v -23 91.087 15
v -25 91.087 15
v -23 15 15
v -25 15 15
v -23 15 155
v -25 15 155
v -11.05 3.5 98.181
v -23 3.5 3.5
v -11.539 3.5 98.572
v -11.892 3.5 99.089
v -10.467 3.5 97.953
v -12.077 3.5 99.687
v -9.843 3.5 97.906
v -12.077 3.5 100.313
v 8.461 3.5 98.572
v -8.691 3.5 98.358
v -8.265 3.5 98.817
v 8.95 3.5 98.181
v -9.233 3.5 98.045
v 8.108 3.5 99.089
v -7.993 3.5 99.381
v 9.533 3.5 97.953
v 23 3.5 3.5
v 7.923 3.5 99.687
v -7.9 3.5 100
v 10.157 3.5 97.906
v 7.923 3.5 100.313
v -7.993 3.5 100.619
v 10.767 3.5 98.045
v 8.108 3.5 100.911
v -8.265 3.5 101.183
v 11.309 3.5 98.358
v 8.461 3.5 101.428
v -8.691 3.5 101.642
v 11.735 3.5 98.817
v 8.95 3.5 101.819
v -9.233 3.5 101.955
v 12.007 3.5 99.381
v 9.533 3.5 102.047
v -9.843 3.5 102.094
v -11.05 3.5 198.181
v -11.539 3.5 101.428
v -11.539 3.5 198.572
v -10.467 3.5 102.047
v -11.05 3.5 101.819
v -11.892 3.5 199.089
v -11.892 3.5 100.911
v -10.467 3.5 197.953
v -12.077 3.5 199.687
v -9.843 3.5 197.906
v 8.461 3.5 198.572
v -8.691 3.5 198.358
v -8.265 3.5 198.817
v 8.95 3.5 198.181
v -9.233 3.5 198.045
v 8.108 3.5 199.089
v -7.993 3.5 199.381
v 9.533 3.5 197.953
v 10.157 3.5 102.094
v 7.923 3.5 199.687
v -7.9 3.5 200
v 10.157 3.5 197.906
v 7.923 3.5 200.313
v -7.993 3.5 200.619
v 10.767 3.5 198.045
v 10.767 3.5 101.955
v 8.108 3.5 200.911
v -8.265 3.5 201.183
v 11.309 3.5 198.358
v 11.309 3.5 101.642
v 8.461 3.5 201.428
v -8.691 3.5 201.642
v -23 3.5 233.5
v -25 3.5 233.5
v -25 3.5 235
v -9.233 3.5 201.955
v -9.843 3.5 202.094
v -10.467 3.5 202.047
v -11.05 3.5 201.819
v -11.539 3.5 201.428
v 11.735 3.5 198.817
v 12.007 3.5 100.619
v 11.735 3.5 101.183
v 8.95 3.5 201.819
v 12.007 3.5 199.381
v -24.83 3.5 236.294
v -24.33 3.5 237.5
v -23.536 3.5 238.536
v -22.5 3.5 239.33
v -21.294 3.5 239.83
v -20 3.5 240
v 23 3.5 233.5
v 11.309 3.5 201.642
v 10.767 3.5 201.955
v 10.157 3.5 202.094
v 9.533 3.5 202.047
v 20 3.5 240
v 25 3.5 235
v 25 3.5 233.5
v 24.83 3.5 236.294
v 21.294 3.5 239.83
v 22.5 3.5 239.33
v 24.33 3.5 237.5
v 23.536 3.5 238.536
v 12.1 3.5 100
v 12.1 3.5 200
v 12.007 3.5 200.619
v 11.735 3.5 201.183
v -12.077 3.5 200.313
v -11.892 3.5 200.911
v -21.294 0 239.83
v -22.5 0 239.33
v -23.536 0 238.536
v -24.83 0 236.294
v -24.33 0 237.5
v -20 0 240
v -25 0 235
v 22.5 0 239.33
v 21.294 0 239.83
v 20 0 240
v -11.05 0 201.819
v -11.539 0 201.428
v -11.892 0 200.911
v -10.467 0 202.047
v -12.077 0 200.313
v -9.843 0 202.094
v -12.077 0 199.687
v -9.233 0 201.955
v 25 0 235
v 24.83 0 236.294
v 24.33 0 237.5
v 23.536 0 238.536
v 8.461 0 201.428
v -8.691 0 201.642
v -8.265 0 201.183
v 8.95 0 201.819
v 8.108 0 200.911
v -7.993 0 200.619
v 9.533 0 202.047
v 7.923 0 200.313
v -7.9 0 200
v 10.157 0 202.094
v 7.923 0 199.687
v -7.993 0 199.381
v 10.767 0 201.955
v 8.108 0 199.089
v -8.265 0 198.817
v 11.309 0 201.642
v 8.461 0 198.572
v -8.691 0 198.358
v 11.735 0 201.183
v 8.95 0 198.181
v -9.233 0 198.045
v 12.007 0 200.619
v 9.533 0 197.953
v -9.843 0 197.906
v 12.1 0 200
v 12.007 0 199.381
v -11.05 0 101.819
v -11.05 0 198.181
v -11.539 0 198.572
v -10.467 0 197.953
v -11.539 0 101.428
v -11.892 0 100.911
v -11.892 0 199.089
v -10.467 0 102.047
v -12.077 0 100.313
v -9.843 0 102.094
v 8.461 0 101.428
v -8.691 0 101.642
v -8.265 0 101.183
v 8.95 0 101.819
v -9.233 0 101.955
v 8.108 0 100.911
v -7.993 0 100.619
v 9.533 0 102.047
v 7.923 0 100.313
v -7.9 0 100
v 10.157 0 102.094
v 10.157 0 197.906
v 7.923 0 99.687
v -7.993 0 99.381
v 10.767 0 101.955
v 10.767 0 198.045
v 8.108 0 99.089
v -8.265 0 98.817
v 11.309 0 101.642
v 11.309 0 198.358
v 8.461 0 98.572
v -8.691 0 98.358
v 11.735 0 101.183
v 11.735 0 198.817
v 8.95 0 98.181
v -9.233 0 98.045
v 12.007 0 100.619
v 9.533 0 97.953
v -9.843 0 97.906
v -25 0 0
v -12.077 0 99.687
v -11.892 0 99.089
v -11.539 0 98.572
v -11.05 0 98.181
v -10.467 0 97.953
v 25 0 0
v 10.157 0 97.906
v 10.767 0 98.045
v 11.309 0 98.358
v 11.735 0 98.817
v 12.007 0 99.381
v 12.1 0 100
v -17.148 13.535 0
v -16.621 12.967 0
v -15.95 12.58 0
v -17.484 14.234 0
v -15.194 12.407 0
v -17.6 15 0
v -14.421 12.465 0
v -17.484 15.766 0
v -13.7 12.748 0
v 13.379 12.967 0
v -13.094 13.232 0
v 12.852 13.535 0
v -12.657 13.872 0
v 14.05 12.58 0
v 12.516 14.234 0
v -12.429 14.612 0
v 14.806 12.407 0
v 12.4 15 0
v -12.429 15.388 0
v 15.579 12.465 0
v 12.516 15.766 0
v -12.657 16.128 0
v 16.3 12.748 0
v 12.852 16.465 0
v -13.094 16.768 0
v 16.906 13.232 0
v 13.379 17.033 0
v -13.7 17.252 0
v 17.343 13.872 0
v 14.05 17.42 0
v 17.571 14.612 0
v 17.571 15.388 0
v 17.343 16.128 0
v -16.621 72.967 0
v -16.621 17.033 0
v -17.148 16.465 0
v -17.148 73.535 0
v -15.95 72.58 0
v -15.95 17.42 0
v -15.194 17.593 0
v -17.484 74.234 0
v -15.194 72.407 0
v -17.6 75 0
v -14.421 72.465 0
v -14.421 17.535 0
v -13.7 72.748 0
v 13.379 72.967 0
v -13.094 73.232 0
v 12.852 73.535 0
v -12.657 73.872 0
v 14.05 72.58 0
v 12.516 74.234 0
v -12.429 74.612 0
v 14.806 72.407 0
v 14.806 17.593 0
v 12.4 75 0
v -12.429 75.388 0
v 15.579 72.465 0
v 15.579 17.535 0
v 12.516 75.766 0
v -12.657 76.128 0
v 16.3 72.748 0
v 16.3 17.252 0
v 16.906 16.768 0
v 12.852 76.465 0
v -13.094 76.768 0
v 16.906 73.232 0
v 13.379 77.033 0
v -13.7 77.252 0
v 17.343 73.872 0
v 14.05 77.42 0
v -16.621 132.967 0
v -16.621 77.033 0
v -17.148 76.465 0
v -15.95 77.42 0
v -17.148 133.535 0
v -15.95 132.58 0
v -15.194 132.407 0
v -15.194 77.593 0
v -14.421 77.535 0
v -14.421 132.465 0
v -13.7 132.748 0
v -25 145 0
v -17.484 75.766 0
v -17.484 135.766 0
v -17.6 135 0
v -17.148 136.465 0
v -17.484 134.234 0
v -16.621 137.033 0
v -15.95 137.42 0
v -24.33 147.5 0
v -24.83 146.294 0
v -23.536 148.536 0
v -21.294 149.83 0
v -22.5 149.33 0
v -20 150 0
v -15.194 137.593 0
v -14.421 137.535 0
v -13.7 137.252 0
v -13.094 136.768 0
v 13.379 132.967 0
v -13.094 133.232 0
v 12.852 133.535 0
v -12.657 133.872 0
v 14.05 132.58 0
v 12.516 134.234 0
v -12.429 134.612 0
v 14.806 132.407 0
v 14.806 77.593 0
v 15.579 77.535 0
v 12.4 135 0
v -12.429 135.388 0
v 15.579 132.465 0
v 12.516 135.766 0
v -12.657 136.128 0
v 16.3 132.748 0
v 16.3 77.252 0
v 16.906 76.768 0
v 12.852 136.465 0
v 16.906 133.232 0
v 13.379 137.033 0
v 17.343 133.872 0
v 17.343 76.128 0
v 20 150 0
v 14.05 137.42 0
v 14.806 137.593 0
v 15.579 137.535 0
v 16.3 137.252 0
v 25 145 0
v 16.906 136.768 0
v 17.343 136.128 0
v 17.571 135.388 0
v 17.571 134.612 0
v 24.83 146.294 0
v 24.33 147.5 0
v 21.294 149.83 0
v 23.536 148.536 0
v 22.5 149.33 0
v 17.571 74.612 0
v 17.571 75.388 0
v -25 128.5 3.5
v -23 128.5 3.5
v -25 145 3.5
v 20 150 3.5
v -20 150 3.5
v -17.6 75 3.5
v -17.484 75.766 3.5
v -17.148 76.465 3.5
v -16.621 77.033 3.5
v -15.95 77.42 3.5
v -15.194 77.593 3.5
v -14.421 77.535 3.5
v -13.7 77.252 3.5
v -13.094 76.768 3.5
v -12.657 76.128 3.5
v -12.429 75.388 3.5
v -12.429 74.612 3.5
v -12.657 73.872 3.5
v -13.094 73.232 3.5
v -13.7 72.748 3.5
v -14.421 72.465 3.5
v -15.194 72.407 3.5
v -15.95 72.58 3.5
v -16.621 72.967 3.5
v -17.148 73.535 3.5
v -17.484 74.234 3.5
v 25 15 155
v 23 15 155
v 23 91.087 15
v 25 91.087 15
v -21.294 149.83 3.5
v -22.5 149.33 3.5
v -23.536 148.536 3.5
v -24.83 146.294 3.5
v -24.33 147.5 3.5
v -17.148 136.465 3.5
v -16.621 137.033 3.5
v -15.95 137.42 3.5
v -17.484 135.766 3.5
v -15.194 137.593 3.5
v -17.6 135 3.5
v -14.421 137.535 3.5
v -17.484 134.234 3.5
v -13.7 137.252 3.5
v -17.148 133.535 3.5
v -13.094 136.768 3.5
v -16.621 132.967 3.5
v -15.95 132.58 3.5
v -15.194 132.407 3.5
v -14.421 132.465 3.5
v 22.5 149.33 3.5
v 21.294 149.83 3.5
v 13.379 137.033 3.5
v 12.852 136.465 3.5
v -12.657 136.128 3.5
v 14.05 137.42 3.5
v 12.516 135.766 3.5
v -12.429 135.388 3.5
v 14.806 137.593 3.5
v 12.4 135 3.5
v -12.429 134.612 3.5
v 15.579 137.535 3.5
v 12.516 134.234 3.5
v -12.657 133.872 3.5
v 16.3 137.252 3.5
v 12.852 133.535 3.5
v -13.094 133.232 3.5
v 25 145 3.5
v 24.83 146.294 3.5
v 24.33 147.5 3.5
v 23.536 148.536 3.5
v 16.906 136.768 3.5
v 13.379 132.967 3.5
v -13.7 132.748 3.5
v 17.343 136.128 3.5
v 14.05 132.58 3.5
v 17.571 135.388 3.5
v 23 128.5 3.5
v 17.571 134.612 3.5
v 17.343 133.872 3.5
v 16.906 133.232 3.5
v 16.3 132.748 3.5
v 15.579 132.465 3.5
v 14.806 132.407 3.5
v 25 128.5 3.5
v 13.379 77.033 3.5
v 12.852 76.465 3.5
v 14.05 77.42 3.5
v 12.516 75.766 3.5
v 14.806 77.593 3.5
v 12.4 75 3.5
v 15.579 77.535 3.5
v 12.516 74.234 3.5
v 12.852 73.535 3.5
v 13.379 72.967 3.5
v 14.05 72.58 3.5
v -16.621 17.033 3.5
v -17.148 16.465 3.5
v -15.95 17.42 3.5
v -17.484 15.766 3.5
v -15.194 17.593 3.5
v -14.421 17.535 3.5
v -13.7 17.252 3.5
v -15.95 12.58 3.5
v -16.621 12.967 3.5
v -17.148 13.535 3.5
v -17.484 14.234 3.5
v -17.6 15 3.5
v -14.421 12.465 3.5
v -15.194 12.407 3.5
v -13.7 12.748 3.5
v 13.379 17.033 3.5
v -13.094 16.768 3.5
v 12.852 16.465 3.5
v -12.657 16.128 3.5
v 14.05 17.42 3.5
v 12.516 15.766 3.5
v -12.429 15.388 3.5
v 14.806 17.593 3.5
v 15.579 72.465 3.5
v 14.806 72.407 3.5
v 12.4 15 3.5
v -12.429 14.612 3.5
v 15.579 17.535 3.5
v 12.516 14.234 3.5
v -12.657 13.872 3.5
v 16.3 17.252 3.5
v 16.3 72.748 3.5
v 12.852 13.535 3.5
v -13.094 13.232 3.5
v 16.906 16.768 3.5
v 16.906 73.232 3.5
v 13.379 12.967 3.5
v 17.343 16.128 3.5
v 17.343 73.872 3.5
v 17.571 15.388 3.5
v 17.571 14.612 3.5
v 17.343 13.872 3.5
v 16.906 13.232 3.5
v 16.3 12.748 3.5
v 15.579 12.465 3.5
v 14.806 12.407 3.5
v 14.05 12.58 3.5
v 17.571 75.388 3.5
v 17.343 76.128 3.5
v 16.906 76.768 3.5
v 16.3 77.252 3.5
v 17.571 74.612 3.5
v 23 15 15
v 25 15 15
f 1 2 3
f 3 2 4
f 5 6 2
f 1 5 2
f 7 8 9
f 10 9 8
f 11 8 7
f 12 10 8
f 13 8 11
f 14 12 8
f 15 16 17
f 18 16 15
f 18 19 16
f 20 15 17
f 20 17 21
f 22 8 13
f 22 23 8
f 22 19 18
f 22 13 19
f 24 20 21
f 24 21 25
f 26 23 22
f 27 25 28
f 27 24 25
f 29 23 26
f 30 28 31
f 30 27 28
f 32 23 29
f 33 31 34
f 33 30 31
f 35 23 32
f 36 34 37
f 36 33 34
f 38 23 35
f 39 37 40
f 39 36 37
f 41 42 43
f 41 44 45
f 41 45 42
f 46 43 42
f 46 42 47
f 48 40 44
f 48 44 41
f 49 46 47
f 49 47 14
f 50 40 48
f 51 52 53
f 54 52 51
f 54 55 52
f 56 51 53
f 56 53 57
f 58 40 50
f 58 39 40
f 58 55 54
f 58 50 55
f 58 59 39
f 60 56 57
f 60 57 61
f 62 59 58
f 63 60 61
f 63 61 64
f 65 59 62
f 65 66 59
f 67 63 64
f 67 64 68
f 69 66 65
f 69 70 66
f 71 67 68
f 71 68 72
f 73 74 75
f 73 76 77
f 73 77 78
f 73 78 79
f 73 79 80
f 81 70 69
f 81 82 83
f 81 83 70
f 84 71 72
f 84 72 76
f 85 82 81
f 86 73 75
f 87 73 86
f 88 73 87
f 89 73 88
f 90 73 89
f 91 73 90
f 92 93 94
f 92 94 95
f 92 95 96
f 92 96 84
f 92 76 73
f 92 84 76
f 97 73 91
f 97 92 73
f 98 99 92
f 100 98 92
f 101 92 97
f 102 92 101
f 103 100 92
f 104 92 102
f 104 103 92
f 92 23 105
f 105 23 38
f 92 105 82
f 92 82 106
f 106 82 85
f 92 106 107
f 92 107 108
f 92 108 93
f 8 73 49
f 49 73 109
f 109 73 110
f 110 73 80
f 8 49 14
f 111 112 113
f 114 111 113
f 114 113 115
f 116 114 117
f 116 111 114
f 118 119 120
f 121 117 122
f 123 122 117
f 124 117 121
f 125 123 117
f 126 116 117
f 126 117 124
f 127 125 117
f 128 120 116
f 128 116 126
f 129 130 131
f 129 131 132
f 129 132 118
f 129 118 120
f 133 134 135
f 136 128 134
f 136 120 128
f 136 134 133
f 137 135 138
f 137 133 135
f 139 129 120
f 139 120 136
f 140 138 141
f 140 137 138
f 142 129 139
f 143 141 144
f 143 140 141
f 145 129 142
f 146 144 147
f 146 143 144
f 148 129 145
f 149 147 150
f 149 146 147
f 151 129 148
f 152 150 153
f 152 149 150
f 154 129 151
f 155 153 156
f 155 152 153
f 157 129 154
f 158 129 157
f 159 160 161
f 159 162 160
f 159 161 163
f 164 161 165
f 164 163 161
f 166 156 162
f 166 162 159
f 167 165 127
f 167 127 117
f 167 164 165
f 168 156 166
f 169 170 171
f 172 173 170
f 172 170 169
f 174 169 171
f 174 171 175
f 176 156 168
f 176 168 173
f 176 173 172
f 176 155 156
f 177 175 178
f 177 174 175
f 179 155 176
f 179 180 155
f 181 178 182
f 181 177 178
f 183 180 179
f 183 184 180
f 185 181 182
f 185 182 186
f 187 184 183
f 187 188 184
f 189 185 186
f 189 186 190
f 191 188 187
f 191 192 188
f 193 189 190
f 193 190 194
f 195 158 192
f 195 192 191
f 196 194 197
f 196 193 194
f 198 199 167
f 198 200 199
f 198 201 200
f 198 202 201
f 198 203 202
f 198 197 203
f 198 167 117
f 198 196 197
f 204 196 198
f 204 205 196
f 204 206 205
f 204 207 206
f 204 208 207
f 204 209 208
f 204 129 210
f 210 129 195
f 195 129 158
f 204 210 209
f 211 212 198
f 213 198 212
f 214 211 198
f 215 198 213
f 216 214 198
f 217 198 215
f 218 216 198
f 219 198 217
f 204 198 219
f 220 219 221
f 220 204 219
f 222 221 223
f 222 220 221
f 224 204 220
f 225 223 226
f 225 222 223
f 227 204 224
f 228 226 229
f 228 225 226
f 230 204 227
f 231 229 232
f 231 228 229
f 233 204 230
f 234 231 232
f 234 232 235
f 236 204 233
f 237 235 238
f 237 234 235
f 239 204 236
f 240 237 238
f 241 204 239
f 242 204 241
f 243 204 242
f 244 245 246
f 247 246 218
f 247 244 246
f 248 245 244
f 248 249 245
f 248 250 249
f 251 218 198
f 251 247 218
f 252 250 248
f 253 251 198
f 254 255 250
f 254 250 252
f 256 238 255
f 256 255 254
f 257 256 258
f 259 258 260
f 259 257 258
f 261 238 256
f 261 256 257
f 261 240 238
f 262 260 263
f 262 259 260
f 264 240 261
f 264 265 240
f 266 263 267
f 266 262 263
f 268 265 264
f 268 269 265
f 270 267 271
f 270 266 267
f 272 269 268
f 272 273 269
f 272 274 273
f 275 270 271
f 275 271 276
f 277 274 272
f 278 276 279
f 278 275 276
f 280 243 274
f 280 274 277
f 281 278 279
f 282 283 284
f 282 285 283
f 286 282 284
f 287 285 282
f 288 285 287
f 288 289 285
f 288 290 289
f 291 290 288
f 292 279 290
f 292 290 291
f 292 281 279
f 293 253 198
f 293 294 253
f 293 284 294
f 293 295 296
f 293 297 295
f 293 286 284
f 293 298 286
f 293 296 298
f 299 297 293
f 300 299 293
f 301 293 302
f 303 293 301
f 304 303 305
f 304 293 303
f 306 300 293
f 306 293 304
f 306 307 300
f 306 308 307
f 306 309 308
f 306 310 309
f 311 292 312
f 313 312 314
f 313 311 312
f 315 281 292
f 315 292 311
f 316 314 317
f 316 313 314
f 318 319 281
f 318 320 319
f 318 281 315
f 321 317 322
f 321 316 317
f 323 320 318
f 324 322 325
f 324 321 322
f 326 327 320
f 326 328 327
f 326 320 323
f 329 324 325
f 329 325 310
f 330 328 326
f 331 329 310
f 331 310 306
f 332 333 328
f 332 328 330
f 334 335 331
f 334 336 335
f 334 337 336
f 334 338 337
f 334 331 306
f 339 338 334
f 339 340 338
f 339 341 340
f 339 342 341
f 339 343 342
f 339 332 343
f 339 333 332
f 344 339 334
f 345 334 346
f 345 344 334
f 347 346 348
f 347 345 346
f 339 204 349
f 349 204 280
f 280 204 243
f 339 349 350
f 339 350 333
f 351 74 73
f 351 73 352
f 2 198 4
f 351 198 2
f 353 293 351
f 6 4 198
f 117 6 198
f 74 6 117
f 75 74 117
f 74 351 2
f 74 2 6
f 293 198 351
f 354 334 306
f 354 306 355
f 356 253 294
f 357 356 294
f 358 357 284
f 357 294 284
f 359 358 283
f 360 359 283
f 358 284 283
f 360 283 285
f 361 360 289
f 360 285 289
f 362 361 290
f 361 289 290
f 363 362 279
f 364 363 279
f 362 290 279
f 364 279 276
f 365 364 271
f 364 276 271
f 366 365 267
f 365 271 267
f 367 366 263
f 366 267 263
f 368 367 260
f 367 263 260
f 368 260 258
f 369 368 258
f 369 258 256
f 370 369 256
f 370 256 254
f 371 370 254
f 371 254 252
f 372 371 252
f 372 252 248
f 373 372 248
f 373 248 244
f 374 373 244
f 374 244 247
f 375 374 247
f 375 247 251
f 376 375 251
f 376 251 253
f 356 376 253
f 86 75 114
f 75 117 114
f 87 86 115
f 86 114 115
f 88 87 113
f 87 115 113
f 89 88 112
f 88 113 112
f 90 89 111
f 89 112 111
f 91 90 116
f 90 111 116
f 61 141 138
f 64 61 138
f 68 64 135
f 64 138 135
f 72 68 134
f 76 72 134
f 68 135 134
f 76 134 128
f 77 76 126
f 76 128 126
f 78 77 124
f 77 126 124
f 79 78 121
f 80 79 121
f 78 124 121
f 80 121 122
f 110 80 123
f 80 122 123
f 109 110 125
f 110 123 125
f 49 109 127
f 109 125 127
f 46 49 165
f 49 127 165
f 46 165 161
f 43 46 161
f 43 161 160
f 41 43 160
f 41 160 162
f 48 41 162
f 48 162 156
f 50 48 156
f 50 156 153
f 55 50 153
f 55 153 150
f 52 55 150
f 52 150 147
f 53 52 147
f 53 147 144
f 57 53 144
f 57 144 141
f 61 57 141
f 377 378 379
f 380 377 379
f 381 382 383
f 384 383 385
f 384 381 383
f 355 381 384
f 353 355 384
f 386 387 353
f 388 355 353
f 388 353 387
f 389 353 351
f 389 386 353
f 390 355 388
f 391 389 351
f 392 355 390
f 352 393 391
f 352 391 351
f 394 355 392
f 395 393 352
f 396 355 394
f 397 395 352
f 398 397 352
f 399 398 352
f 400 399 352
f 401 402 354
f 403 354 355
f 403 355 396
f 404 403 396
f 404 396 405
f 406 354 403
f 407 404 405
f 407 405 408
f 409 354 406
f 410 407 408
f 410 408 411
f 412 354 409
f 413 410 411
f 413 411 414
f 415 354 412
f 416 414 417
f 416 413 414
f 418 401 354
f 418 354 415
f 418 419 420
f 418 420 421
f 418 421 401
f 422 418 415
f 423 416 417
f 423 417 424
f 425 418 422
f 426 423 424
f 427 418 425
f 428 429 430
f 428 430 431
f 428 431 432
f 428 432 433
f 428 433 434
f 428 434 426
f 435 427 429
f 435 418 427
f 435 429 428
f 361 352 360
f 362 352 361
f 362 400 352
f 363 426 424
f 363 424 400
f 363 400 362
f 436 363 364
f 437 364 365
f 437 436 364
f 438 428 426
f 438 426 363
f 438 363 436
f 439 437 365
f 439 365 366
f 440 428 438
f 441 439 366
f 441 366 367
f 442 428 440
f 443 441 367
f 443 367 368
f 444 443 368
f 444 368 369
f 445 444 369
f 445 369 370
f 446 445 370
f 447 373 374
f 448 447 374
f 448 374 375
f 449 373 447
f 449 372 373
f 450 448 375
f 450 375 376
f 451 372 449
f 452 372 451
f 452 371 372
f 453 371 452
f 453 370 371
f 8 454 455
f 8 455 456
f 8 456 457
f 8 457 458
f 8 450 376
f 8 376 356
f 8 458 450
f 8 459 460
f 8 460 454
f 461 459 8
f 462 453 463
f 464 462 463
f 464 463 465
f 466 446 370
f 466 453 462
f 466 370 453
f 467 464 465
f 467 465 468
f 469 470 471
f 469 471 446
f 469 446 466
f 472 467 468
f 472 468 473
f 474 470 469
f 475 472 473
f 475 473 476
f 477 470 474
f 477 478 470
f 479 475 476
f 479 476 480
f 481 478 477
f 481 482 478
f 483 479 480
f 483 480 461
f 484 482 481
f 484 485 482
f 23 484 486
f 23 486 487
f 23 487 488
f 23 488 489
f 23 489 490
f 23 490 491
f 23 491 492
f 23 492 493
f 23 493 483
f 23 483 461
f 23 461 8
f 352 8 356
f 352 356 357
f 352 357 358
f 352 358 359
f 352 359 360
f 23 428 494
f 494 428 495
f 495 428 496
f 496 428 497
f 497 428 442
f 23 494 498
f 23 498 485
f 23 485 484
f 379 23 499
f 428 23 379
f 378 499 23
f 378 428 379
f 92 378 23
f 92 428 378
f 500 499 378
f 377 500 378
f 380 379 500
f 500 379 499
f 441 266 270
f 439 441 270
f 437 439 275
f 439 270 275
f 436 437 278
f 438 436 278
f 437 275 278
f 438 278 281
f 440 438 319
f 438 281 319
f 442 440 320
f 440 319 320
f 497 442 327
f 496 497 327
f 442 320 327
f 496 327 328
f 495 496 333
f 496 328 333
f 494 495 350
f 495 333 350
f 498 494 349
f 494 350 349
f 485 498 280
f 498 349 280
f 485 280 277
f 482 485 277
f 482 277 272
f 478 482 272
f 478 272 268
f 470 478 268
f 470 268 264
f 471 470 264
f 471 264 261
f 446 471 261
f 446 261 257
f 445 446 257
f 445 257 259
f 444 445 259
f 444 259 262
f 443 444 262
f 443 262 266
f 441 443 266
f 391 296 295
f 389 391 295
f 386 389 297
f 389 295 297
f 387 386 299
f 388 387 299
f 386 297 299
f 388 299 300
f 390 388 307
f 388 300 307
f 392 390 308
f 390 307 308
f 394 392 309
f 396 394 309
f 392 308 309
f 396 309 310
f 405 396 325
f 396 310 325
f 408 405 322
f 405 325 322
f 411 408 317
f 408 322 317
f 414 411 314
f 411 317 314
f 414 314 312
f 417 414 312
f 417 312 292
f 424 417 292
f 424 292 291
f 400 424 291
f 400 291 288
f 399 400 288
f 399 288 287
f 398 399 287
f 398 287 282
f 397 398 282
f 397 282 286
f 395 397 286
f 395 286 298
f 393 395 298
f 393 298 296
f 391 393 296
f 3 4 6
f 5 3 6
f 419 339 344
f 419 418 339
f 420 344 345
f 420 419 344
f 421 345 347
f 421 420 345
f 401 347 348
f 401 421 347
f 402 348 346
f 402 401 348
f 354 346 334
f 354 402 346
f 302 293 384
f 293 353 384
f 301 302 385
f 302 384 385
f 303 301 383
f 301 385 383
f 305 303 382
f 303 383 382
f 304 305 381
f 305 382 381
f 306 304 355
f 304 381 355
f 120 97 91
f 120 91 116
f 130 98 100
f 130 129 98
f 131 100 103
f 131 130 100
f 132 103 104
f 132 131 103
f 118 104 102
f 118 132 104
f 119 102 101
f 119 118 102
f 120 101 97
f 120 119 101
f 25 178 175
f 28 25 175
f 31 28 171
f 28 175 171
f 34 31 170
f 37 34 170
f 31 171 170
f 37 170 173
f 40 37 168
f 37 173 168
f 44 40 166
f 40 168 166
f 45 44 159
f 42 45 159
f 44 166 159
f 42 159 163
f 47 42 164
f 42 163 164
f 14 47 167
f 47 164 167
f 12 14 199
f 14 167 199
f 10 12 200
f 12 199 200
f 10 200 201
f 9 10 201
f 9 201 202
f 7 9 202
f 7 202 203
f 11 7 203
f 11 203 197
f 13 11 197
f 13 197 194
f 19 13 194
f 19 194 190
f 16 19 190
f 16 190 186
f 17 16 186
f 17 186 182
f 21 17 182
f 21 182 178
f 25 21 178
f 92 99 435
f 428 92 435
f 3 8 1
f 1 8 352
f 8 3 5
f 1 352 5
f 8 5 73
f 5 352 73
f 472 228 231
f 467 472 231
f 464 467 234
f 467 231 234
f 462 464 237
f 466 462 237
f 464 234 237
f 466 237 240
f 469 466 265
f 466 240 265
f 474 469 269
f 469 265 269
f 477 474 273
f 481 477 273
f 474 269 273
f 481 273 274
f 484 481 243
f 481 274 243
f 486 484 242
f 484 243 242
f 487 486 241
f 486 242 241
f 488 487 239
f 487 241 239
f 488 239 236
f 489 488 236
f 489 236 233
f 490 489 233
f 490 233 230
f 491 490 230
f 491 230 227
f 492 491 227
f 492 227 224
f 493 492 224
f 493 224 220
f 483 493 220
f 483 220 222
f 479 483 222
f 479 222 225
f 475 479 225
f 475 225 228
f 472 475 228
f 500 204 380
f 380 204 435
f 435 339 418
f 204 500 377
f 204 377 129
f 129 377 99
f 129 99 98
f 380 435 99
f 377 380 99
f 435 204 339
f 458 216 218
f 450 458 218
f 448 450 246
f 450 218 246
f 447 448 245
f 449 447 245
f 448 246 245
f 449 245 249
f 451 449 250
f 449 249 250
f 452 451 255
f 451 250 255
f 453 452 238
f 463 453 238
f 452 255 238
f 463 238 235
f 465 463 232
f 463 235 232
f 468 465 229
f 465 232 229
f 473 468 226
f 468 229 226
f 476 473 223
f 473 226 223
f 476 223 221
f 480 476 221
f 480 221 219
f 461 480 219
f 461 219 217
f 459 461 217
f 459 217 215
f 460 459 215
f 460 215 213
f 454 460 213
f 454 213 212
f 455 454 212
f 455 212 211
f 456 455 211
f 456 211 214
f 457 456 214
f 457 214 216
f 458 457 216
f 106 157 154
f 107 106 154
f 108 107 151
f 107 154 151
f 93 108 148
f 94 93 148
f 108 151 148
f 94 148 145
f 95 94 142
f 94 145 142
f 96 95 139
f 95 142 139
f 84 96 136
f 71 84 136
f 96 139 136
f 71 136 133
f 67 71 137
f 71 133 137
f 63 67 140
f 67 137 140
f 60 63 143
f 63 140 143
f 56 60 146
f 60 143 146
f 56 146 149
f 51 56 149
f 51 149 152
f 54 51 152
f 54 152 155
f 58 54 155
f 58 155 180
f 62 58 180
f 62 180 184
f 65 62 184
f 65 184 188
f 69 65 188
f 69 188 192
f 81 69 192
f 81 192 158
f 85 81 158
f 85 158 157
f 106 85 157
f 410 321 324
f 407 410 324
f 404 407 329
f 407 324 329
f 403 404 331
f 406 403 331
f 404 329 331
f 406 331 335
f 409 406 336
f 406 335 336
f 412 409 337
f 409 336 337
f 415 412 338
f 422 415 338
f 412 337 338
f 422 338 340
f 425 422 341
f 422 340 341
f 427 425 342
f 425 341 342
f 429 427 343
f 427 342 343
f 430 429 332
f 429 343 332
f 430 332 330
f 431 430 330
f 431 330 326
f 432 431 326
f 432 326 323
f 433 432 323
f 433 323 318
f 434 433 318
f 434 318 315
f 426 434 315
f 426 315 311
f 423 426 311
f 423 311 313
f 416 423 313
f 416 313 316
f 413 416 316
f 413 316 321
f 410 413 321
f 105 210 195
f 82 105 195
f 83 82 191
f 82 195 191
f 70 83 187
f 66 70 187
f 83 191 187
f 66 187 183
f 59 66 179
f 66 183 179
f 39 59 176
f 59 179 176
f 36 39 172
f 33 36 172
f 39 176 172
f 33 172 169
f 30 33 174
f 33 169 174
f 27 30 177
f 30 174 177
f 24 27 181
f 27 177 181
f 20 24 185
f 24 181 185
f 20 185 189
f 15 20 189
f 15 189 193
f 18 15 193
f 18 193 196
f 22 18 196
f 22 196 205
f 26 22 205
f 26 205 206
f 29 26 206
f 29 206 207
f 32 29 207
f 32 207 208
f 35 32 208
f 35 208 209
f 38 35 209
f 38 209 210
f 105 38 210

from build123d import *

# Parameters (mm, degrees)
EXTRUDE_1_DEPTH     = 25
SKETCH_4_R          = 2.6
CUT_EXTRUDE_2_DEPTH = 241
FILLET_1_R          = 5
FILLET_2_R          = 5
SKETCH_5_R          = 2.1
CUT_EXTRUDE_3_DEPTH = 151
EXTRUDE_2_DEPTH     = 2
EXTRUDE_3_DEPTH     = 2
CUT_EXTRUDE_4_DEPTH = 51


with BuildPart() as part:
    # 草图1 → 凸台-拉伸1 (new body, symmetric)
    with BuildSketch(Plane(origin=(0, 0, 0), x_dir=(0, 0, -1), z_dir=(1, 0, 0))):
        Polygon((-240, 0), (0, 0), (0, 150), (-3.5, 150), (-3.5, 3.5), (-240, 3.5), align=None)
    extrude(amount=EXTRUDE_1_DEPTH, both=True)

    # 草图4 → 切除-拉伸2 (cut, through all)
    with BuildSketch(Plane(origin=(0, 0, 0), x_dir=(-1, 0, 0), z_dir=(0, 0, -1))):
        with Locations((-15, 135)):
            Circle(SKETCH_4_R)
        with Locations((15, 135)):
            Circle(SKETCH_4_R)
        with Locations((15, 15)):
            Circle(SKETCH_4_R)
        with Locations((-15, 15)):
            Circle(SKETCH_4_R)
        with Locations((-15, 75)):
            Circle(SKETCH_4_R)
        with Locations((15, 75)):
            Circle(SKETCH_4_R)
    extrude(amount=-CUT_EXTRUDE_2_DEPTH, mode=Mode.SUBTRACT)

    # 圆角1
    fillet_1_edges = [part.edges().sort_by_distance(p)[0] for p in [
        (25, 1.75, 240),
        (-25, 1.75, 240),
    ]]
    fillet(fillet_1_edges, radius=FILLET_1_R)

    # 圆角2
    fillet_2_edges = [part.edges().sort_by_distance(p)[0] for p in [
        (25, 150, 1.75),
        (-25, 150, 1.75),
    ]]
    fillet(fillet_2_edges, radius=FILLET_2_R)

    # 草图5 → 切除-拉伸3 (cut, through all)
    with BuildSketch(Plane.XZ):
        with Locations((-10, 200)):
            Circle(SKETCH_5_R)
        with Locations((-10, 100)):
            Circle(SKETCH_5_R)
        with Locations((10, 100)):
            Circle(SKETCH_5_R)
        with Locations((10, 200)):
            Circle(SKETCH_5_R)
    extrude(amount=-CUT_EXTRUDE_3_DEPTH, mode=Mode.SUBTRACT)

    # 草图8 → 凸台-拉伸2 (add)
    with BuildSketch(Plane(origin=(25, 0, 0), x_dir=(0, 0, -1), z_dir=(1, 0, 0))):
        Polygon((-3.5, 3.5), (-233.5, 3.5), (-3.5, 128.5), align=None)
    extrude(amount=-EXTRUDE_2_DEPTH)

    # 草图9 → 凸台-拉伸3 (add)
    with BuildSketch(Plane.ZY.offset(25)):
        Polygon((3.5, 3.5), (233.5, 3.5), (3.5, 128.5), align=None)
    extrude(amount=-EXTRUDE_3_DEPTH)

    # 草图10 → 切除-拉伸4 (cut, through all)
    with BuildSketch(Plane.ZY.offset(25)):
        Polygon((15, 91.086956522), (15, 15), (155, 15), align=None)
    extrude(amount=-CUT_EXTRUDE_4_DEPTH, mode=Mode.SUBTRACT)


solid = part.part
